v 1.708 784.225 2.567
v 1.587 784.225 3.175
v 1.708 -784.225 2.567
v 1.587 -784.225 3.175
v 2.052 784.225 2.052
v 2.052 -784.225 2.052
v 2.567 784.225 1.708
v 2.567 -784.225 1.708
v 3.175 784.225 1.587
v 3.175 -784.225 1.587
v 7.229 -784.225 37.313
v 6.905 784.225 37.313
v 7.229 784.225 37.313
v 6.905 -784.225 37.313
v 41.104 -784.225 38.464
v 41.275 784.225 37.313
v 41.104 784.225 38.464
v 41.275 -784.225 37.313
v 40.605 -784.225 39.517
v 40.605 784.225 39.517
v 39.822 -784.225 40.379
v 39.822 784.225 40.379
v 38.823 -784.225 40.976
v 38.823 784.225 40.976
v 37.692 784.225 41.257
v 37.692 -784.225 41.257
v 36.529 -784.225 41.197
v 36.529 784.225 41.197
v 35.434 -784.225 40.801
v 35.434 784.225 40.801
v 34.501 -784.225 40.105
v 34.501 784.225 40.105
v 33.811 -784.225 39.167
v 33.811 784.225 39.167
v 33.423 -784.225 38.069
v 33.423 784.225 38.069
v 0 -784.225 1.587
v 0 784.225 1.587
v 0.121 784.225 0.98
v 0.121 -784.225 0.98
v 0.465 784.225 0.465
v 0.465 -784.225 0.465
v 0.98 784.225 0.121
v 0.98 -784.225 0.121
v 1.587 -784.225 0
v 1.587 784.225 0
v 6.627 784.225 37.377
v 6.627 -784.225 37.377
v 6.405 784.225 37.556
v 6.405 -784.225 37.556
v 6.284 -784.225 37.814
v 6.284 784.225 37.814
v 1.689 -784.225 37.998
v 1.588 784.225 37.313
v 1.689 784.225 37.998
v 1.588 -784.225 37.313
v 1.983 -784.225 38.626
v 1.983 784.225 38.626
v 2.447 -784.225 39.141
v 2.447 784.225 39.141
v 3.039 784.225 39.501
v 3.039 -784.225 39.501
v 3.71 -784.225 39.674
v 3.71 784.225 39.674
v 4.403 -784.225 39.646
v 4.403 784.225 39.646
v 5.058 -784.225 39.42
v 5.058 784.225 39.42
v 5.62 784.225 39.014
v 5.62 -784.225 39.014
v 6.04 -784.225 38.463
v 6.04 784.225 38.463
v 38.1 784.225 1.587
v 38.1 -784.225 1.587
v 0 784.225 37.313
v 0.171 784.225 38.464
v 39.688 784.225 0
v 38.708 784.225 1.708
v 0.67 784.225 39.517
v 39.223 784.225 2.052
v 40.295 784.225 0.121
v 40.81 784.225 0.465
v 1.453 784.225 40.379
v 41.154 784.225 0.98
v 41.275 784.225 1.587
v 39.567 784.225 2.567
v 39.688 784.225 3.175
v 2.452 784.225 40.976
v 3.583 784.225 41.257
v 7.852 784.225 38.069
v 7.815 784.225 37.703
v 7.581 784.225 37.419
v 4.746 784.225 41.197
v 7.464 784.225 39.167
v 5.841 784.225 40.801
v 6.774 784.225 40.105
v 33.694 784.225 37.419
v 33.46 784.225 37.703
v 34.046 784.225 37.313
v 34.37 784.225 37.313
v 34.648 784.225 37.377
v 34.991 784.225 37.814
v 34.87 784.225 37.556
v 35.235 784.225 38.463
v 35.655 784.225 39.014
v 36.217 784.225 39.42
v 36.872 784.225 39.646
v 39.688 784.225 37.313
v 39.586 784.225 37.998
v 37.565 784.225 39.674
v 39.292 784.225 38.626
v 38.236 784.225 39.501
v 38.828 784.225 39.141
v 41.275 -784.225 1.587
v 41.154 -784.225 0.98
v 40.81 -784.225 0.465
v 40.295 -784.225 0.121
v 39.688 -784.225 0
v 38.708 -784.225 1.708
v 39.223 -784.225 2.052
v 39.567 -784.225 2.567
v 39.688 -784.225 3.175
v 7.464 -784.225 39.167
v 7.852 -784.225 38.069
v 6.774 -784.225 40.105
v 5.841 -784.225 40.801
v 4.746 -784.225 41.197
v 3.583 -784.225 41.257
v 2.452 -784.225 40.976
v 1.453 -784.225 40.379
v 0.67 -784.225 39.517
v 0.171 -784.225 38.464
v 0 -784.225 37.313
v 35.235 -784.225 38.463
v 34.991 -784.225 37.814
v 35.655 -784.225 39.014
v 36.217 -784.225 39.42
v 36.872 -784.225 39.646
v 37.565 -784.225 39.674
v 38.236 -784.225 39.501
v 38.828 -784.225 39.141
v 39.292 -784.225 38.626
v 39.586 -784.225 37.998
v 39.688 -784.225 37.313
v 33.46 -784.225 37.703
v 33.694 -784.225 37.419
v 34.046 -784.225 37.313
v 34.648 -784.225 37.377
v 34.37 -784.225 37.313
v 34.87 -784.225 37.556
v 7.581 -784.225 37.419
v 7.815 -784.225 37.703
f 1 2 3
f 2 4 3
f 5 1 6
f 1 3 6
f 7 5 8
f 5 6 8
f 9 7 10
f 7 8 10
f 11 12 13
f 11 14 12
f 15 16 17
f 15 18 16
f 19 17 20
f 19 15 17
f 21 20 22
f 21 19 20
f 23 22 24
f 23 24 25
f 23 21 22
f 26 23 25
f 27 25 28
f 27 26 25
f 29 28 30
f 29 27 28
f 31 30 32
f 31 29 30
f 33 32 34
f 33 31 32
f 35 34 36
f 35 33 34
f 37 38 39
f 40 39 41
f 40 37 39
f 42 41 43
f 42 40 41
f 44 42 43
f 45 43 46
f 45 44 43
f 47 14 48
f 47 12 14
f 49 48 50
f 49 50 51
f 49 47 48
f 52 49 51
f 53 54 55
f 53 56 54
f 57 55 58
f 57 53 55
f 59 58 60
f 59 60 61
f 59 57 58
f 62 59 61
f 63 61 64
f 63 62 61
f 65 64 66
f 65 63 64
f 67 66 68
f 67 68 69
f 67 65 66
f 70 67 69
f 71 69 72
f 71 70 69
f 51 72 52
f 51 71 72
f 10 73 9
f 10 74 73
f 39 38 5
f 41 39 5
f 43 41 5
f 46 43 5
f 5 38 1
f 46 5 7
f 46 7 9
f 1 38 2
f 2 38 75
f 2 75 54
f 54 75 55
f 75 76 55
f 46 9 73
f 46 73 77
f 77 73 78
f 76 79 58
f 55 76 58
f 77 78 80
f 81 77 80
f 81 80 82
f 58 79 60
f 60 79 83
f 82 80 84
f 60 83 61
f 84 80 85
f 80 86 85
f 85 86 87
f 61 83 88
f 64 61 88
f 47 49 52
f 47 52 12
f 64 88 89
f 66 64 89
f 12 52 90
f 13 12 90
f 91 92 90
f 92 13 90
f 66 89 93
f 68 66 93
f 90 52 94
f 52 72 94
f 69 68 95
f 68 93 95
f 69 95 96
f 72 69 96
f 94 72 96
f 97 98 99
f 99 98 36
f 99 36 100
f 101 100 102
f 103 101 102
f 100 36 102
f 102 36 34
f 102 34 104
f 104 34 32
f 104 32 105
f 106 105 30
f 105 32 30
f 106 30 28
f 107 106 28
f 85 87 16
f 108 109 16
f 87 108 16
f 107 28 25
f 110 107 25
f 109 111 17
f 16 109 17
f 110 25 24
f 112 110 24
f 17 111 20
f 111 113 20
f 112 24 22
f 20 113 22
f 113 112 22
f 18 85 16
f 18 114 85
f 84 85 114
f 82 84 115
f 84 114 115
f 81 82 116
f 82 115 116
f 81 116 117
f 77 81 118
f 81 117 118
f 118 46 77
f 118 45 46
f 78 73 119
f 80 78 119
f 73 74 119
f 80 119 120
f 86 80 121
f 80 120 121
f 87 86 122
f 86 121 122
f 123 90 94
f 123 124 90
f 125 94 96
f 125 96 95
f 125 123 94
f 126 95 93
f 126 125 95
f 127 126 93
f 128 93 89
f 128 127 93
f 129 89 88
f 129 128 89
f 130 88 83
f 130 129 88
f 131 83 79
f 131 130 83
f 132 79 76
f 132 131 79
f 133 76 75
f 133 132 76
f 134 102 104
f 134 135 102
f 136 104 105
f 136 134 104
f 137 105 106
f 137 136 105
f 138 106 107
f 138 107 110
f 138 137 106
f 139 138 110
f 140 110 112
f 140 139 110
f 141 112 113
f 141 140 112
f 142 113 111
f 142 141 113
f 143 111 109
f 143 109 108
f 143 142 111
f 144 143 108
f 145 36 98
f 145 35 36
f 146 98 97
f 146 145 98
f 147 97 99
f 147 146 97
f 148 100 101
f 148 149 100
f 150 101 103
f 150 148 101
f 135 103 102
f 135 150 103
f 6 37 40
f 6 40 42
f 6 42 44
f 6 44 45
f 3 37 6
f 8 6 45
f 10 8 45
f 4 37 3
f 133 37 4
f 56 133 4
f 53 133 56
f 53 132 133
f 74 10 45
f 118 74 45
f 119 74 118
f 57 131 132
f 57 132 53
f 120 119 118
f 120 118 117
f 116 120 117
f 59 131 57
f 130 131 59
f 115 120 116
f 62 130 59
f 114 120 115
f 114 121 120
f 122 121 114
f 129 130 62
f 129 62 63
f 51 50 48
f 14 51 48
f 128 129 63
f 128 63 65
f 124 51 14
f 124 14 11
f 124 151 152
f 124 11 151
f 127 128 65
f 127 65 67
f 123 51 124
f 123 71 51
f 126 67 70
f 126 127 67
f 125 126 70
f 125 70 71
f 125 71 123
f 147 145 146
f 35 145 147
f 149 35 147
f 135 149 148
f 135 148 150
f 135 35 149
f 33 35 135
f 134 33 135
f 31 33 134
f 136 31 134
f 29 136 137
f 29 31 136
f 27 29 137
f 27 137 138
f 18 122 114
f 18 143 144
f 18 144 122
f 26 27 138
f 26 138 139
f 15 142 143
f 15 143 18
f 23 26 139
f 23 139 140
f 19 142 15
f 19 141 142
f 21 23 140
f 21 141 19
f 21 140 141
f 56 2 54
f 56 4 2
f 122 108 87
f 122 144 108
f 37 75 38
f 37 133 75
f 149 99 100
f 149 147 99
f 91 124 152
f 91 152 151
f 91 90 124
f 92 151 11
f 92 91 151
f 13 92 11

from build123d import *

# Parameters (mm, degrees)
F1_DEPTH = 784.225
F2_R     = 1.5875
F3_R     = 0.635


with BuildPart() as f1:
    # F0 (on Front) → F1 (new body, symmetric)
    with BuildSketch(Plane.XZ):
        with BuildLine():
            Line((0, 37.3126), (0, 0))
            Line((0, 0), (41.275, 0))
            Line((41.275, 0), (41.275, 37.3126))
            ThreePointArc((41.275, 37.3126), (37.3126, 41.275), (33.3502, 37.3126))
            Line((33.3502, 37.3126), (34.9377, 37.3126))
            ThreePointArc((34.9377, 37.3126), (37.3126, 39.6875), (39.6875, 37.3126))
            Line((39.6875, 37.3126), (39.6875, 1.5875))
            Line((39.6875, 1.5875), (1.5875, 1.5875))
            Line((1.5875, 1.5875), (1.5875, 37.3126))
            ThreePointArc((1.5875, 37.3126), (3.9624, 39.6875), (6.3373, 37.3126))
            Line((6.3373, 37.3126), (7.9248, 37.3126))
            ThreePointArc((7.9248, 37.3126), (3.9624, 41.275), (0, 37.3126))
        make_face()
    extrude(amount=F1_DEPTH, both=True)

    # F2
    f2_edges = [f1.edges().sort_by_distance(p)[0] for p in [
        (0, 0, 0),
        (41.275, 0, 0),
        (1.5875, 0, 1.5875),
        (39.6875, 0, 1.5875),
    ]]
    fillet(f2_edges, radius=F2_R)

    # F3
    f3_edges = [f1.edges().sort_by_distance(p)[0] for p in [
        (6.3373, 0, 37.3126),
        (7.9248, 0, 37.3126),
        (33.3502, 0, 37.3126),
        (34.9377, 0, 37.3126),
    ]]
    fillet(f3_edges, radius=F3_R)


solid = f1.part
